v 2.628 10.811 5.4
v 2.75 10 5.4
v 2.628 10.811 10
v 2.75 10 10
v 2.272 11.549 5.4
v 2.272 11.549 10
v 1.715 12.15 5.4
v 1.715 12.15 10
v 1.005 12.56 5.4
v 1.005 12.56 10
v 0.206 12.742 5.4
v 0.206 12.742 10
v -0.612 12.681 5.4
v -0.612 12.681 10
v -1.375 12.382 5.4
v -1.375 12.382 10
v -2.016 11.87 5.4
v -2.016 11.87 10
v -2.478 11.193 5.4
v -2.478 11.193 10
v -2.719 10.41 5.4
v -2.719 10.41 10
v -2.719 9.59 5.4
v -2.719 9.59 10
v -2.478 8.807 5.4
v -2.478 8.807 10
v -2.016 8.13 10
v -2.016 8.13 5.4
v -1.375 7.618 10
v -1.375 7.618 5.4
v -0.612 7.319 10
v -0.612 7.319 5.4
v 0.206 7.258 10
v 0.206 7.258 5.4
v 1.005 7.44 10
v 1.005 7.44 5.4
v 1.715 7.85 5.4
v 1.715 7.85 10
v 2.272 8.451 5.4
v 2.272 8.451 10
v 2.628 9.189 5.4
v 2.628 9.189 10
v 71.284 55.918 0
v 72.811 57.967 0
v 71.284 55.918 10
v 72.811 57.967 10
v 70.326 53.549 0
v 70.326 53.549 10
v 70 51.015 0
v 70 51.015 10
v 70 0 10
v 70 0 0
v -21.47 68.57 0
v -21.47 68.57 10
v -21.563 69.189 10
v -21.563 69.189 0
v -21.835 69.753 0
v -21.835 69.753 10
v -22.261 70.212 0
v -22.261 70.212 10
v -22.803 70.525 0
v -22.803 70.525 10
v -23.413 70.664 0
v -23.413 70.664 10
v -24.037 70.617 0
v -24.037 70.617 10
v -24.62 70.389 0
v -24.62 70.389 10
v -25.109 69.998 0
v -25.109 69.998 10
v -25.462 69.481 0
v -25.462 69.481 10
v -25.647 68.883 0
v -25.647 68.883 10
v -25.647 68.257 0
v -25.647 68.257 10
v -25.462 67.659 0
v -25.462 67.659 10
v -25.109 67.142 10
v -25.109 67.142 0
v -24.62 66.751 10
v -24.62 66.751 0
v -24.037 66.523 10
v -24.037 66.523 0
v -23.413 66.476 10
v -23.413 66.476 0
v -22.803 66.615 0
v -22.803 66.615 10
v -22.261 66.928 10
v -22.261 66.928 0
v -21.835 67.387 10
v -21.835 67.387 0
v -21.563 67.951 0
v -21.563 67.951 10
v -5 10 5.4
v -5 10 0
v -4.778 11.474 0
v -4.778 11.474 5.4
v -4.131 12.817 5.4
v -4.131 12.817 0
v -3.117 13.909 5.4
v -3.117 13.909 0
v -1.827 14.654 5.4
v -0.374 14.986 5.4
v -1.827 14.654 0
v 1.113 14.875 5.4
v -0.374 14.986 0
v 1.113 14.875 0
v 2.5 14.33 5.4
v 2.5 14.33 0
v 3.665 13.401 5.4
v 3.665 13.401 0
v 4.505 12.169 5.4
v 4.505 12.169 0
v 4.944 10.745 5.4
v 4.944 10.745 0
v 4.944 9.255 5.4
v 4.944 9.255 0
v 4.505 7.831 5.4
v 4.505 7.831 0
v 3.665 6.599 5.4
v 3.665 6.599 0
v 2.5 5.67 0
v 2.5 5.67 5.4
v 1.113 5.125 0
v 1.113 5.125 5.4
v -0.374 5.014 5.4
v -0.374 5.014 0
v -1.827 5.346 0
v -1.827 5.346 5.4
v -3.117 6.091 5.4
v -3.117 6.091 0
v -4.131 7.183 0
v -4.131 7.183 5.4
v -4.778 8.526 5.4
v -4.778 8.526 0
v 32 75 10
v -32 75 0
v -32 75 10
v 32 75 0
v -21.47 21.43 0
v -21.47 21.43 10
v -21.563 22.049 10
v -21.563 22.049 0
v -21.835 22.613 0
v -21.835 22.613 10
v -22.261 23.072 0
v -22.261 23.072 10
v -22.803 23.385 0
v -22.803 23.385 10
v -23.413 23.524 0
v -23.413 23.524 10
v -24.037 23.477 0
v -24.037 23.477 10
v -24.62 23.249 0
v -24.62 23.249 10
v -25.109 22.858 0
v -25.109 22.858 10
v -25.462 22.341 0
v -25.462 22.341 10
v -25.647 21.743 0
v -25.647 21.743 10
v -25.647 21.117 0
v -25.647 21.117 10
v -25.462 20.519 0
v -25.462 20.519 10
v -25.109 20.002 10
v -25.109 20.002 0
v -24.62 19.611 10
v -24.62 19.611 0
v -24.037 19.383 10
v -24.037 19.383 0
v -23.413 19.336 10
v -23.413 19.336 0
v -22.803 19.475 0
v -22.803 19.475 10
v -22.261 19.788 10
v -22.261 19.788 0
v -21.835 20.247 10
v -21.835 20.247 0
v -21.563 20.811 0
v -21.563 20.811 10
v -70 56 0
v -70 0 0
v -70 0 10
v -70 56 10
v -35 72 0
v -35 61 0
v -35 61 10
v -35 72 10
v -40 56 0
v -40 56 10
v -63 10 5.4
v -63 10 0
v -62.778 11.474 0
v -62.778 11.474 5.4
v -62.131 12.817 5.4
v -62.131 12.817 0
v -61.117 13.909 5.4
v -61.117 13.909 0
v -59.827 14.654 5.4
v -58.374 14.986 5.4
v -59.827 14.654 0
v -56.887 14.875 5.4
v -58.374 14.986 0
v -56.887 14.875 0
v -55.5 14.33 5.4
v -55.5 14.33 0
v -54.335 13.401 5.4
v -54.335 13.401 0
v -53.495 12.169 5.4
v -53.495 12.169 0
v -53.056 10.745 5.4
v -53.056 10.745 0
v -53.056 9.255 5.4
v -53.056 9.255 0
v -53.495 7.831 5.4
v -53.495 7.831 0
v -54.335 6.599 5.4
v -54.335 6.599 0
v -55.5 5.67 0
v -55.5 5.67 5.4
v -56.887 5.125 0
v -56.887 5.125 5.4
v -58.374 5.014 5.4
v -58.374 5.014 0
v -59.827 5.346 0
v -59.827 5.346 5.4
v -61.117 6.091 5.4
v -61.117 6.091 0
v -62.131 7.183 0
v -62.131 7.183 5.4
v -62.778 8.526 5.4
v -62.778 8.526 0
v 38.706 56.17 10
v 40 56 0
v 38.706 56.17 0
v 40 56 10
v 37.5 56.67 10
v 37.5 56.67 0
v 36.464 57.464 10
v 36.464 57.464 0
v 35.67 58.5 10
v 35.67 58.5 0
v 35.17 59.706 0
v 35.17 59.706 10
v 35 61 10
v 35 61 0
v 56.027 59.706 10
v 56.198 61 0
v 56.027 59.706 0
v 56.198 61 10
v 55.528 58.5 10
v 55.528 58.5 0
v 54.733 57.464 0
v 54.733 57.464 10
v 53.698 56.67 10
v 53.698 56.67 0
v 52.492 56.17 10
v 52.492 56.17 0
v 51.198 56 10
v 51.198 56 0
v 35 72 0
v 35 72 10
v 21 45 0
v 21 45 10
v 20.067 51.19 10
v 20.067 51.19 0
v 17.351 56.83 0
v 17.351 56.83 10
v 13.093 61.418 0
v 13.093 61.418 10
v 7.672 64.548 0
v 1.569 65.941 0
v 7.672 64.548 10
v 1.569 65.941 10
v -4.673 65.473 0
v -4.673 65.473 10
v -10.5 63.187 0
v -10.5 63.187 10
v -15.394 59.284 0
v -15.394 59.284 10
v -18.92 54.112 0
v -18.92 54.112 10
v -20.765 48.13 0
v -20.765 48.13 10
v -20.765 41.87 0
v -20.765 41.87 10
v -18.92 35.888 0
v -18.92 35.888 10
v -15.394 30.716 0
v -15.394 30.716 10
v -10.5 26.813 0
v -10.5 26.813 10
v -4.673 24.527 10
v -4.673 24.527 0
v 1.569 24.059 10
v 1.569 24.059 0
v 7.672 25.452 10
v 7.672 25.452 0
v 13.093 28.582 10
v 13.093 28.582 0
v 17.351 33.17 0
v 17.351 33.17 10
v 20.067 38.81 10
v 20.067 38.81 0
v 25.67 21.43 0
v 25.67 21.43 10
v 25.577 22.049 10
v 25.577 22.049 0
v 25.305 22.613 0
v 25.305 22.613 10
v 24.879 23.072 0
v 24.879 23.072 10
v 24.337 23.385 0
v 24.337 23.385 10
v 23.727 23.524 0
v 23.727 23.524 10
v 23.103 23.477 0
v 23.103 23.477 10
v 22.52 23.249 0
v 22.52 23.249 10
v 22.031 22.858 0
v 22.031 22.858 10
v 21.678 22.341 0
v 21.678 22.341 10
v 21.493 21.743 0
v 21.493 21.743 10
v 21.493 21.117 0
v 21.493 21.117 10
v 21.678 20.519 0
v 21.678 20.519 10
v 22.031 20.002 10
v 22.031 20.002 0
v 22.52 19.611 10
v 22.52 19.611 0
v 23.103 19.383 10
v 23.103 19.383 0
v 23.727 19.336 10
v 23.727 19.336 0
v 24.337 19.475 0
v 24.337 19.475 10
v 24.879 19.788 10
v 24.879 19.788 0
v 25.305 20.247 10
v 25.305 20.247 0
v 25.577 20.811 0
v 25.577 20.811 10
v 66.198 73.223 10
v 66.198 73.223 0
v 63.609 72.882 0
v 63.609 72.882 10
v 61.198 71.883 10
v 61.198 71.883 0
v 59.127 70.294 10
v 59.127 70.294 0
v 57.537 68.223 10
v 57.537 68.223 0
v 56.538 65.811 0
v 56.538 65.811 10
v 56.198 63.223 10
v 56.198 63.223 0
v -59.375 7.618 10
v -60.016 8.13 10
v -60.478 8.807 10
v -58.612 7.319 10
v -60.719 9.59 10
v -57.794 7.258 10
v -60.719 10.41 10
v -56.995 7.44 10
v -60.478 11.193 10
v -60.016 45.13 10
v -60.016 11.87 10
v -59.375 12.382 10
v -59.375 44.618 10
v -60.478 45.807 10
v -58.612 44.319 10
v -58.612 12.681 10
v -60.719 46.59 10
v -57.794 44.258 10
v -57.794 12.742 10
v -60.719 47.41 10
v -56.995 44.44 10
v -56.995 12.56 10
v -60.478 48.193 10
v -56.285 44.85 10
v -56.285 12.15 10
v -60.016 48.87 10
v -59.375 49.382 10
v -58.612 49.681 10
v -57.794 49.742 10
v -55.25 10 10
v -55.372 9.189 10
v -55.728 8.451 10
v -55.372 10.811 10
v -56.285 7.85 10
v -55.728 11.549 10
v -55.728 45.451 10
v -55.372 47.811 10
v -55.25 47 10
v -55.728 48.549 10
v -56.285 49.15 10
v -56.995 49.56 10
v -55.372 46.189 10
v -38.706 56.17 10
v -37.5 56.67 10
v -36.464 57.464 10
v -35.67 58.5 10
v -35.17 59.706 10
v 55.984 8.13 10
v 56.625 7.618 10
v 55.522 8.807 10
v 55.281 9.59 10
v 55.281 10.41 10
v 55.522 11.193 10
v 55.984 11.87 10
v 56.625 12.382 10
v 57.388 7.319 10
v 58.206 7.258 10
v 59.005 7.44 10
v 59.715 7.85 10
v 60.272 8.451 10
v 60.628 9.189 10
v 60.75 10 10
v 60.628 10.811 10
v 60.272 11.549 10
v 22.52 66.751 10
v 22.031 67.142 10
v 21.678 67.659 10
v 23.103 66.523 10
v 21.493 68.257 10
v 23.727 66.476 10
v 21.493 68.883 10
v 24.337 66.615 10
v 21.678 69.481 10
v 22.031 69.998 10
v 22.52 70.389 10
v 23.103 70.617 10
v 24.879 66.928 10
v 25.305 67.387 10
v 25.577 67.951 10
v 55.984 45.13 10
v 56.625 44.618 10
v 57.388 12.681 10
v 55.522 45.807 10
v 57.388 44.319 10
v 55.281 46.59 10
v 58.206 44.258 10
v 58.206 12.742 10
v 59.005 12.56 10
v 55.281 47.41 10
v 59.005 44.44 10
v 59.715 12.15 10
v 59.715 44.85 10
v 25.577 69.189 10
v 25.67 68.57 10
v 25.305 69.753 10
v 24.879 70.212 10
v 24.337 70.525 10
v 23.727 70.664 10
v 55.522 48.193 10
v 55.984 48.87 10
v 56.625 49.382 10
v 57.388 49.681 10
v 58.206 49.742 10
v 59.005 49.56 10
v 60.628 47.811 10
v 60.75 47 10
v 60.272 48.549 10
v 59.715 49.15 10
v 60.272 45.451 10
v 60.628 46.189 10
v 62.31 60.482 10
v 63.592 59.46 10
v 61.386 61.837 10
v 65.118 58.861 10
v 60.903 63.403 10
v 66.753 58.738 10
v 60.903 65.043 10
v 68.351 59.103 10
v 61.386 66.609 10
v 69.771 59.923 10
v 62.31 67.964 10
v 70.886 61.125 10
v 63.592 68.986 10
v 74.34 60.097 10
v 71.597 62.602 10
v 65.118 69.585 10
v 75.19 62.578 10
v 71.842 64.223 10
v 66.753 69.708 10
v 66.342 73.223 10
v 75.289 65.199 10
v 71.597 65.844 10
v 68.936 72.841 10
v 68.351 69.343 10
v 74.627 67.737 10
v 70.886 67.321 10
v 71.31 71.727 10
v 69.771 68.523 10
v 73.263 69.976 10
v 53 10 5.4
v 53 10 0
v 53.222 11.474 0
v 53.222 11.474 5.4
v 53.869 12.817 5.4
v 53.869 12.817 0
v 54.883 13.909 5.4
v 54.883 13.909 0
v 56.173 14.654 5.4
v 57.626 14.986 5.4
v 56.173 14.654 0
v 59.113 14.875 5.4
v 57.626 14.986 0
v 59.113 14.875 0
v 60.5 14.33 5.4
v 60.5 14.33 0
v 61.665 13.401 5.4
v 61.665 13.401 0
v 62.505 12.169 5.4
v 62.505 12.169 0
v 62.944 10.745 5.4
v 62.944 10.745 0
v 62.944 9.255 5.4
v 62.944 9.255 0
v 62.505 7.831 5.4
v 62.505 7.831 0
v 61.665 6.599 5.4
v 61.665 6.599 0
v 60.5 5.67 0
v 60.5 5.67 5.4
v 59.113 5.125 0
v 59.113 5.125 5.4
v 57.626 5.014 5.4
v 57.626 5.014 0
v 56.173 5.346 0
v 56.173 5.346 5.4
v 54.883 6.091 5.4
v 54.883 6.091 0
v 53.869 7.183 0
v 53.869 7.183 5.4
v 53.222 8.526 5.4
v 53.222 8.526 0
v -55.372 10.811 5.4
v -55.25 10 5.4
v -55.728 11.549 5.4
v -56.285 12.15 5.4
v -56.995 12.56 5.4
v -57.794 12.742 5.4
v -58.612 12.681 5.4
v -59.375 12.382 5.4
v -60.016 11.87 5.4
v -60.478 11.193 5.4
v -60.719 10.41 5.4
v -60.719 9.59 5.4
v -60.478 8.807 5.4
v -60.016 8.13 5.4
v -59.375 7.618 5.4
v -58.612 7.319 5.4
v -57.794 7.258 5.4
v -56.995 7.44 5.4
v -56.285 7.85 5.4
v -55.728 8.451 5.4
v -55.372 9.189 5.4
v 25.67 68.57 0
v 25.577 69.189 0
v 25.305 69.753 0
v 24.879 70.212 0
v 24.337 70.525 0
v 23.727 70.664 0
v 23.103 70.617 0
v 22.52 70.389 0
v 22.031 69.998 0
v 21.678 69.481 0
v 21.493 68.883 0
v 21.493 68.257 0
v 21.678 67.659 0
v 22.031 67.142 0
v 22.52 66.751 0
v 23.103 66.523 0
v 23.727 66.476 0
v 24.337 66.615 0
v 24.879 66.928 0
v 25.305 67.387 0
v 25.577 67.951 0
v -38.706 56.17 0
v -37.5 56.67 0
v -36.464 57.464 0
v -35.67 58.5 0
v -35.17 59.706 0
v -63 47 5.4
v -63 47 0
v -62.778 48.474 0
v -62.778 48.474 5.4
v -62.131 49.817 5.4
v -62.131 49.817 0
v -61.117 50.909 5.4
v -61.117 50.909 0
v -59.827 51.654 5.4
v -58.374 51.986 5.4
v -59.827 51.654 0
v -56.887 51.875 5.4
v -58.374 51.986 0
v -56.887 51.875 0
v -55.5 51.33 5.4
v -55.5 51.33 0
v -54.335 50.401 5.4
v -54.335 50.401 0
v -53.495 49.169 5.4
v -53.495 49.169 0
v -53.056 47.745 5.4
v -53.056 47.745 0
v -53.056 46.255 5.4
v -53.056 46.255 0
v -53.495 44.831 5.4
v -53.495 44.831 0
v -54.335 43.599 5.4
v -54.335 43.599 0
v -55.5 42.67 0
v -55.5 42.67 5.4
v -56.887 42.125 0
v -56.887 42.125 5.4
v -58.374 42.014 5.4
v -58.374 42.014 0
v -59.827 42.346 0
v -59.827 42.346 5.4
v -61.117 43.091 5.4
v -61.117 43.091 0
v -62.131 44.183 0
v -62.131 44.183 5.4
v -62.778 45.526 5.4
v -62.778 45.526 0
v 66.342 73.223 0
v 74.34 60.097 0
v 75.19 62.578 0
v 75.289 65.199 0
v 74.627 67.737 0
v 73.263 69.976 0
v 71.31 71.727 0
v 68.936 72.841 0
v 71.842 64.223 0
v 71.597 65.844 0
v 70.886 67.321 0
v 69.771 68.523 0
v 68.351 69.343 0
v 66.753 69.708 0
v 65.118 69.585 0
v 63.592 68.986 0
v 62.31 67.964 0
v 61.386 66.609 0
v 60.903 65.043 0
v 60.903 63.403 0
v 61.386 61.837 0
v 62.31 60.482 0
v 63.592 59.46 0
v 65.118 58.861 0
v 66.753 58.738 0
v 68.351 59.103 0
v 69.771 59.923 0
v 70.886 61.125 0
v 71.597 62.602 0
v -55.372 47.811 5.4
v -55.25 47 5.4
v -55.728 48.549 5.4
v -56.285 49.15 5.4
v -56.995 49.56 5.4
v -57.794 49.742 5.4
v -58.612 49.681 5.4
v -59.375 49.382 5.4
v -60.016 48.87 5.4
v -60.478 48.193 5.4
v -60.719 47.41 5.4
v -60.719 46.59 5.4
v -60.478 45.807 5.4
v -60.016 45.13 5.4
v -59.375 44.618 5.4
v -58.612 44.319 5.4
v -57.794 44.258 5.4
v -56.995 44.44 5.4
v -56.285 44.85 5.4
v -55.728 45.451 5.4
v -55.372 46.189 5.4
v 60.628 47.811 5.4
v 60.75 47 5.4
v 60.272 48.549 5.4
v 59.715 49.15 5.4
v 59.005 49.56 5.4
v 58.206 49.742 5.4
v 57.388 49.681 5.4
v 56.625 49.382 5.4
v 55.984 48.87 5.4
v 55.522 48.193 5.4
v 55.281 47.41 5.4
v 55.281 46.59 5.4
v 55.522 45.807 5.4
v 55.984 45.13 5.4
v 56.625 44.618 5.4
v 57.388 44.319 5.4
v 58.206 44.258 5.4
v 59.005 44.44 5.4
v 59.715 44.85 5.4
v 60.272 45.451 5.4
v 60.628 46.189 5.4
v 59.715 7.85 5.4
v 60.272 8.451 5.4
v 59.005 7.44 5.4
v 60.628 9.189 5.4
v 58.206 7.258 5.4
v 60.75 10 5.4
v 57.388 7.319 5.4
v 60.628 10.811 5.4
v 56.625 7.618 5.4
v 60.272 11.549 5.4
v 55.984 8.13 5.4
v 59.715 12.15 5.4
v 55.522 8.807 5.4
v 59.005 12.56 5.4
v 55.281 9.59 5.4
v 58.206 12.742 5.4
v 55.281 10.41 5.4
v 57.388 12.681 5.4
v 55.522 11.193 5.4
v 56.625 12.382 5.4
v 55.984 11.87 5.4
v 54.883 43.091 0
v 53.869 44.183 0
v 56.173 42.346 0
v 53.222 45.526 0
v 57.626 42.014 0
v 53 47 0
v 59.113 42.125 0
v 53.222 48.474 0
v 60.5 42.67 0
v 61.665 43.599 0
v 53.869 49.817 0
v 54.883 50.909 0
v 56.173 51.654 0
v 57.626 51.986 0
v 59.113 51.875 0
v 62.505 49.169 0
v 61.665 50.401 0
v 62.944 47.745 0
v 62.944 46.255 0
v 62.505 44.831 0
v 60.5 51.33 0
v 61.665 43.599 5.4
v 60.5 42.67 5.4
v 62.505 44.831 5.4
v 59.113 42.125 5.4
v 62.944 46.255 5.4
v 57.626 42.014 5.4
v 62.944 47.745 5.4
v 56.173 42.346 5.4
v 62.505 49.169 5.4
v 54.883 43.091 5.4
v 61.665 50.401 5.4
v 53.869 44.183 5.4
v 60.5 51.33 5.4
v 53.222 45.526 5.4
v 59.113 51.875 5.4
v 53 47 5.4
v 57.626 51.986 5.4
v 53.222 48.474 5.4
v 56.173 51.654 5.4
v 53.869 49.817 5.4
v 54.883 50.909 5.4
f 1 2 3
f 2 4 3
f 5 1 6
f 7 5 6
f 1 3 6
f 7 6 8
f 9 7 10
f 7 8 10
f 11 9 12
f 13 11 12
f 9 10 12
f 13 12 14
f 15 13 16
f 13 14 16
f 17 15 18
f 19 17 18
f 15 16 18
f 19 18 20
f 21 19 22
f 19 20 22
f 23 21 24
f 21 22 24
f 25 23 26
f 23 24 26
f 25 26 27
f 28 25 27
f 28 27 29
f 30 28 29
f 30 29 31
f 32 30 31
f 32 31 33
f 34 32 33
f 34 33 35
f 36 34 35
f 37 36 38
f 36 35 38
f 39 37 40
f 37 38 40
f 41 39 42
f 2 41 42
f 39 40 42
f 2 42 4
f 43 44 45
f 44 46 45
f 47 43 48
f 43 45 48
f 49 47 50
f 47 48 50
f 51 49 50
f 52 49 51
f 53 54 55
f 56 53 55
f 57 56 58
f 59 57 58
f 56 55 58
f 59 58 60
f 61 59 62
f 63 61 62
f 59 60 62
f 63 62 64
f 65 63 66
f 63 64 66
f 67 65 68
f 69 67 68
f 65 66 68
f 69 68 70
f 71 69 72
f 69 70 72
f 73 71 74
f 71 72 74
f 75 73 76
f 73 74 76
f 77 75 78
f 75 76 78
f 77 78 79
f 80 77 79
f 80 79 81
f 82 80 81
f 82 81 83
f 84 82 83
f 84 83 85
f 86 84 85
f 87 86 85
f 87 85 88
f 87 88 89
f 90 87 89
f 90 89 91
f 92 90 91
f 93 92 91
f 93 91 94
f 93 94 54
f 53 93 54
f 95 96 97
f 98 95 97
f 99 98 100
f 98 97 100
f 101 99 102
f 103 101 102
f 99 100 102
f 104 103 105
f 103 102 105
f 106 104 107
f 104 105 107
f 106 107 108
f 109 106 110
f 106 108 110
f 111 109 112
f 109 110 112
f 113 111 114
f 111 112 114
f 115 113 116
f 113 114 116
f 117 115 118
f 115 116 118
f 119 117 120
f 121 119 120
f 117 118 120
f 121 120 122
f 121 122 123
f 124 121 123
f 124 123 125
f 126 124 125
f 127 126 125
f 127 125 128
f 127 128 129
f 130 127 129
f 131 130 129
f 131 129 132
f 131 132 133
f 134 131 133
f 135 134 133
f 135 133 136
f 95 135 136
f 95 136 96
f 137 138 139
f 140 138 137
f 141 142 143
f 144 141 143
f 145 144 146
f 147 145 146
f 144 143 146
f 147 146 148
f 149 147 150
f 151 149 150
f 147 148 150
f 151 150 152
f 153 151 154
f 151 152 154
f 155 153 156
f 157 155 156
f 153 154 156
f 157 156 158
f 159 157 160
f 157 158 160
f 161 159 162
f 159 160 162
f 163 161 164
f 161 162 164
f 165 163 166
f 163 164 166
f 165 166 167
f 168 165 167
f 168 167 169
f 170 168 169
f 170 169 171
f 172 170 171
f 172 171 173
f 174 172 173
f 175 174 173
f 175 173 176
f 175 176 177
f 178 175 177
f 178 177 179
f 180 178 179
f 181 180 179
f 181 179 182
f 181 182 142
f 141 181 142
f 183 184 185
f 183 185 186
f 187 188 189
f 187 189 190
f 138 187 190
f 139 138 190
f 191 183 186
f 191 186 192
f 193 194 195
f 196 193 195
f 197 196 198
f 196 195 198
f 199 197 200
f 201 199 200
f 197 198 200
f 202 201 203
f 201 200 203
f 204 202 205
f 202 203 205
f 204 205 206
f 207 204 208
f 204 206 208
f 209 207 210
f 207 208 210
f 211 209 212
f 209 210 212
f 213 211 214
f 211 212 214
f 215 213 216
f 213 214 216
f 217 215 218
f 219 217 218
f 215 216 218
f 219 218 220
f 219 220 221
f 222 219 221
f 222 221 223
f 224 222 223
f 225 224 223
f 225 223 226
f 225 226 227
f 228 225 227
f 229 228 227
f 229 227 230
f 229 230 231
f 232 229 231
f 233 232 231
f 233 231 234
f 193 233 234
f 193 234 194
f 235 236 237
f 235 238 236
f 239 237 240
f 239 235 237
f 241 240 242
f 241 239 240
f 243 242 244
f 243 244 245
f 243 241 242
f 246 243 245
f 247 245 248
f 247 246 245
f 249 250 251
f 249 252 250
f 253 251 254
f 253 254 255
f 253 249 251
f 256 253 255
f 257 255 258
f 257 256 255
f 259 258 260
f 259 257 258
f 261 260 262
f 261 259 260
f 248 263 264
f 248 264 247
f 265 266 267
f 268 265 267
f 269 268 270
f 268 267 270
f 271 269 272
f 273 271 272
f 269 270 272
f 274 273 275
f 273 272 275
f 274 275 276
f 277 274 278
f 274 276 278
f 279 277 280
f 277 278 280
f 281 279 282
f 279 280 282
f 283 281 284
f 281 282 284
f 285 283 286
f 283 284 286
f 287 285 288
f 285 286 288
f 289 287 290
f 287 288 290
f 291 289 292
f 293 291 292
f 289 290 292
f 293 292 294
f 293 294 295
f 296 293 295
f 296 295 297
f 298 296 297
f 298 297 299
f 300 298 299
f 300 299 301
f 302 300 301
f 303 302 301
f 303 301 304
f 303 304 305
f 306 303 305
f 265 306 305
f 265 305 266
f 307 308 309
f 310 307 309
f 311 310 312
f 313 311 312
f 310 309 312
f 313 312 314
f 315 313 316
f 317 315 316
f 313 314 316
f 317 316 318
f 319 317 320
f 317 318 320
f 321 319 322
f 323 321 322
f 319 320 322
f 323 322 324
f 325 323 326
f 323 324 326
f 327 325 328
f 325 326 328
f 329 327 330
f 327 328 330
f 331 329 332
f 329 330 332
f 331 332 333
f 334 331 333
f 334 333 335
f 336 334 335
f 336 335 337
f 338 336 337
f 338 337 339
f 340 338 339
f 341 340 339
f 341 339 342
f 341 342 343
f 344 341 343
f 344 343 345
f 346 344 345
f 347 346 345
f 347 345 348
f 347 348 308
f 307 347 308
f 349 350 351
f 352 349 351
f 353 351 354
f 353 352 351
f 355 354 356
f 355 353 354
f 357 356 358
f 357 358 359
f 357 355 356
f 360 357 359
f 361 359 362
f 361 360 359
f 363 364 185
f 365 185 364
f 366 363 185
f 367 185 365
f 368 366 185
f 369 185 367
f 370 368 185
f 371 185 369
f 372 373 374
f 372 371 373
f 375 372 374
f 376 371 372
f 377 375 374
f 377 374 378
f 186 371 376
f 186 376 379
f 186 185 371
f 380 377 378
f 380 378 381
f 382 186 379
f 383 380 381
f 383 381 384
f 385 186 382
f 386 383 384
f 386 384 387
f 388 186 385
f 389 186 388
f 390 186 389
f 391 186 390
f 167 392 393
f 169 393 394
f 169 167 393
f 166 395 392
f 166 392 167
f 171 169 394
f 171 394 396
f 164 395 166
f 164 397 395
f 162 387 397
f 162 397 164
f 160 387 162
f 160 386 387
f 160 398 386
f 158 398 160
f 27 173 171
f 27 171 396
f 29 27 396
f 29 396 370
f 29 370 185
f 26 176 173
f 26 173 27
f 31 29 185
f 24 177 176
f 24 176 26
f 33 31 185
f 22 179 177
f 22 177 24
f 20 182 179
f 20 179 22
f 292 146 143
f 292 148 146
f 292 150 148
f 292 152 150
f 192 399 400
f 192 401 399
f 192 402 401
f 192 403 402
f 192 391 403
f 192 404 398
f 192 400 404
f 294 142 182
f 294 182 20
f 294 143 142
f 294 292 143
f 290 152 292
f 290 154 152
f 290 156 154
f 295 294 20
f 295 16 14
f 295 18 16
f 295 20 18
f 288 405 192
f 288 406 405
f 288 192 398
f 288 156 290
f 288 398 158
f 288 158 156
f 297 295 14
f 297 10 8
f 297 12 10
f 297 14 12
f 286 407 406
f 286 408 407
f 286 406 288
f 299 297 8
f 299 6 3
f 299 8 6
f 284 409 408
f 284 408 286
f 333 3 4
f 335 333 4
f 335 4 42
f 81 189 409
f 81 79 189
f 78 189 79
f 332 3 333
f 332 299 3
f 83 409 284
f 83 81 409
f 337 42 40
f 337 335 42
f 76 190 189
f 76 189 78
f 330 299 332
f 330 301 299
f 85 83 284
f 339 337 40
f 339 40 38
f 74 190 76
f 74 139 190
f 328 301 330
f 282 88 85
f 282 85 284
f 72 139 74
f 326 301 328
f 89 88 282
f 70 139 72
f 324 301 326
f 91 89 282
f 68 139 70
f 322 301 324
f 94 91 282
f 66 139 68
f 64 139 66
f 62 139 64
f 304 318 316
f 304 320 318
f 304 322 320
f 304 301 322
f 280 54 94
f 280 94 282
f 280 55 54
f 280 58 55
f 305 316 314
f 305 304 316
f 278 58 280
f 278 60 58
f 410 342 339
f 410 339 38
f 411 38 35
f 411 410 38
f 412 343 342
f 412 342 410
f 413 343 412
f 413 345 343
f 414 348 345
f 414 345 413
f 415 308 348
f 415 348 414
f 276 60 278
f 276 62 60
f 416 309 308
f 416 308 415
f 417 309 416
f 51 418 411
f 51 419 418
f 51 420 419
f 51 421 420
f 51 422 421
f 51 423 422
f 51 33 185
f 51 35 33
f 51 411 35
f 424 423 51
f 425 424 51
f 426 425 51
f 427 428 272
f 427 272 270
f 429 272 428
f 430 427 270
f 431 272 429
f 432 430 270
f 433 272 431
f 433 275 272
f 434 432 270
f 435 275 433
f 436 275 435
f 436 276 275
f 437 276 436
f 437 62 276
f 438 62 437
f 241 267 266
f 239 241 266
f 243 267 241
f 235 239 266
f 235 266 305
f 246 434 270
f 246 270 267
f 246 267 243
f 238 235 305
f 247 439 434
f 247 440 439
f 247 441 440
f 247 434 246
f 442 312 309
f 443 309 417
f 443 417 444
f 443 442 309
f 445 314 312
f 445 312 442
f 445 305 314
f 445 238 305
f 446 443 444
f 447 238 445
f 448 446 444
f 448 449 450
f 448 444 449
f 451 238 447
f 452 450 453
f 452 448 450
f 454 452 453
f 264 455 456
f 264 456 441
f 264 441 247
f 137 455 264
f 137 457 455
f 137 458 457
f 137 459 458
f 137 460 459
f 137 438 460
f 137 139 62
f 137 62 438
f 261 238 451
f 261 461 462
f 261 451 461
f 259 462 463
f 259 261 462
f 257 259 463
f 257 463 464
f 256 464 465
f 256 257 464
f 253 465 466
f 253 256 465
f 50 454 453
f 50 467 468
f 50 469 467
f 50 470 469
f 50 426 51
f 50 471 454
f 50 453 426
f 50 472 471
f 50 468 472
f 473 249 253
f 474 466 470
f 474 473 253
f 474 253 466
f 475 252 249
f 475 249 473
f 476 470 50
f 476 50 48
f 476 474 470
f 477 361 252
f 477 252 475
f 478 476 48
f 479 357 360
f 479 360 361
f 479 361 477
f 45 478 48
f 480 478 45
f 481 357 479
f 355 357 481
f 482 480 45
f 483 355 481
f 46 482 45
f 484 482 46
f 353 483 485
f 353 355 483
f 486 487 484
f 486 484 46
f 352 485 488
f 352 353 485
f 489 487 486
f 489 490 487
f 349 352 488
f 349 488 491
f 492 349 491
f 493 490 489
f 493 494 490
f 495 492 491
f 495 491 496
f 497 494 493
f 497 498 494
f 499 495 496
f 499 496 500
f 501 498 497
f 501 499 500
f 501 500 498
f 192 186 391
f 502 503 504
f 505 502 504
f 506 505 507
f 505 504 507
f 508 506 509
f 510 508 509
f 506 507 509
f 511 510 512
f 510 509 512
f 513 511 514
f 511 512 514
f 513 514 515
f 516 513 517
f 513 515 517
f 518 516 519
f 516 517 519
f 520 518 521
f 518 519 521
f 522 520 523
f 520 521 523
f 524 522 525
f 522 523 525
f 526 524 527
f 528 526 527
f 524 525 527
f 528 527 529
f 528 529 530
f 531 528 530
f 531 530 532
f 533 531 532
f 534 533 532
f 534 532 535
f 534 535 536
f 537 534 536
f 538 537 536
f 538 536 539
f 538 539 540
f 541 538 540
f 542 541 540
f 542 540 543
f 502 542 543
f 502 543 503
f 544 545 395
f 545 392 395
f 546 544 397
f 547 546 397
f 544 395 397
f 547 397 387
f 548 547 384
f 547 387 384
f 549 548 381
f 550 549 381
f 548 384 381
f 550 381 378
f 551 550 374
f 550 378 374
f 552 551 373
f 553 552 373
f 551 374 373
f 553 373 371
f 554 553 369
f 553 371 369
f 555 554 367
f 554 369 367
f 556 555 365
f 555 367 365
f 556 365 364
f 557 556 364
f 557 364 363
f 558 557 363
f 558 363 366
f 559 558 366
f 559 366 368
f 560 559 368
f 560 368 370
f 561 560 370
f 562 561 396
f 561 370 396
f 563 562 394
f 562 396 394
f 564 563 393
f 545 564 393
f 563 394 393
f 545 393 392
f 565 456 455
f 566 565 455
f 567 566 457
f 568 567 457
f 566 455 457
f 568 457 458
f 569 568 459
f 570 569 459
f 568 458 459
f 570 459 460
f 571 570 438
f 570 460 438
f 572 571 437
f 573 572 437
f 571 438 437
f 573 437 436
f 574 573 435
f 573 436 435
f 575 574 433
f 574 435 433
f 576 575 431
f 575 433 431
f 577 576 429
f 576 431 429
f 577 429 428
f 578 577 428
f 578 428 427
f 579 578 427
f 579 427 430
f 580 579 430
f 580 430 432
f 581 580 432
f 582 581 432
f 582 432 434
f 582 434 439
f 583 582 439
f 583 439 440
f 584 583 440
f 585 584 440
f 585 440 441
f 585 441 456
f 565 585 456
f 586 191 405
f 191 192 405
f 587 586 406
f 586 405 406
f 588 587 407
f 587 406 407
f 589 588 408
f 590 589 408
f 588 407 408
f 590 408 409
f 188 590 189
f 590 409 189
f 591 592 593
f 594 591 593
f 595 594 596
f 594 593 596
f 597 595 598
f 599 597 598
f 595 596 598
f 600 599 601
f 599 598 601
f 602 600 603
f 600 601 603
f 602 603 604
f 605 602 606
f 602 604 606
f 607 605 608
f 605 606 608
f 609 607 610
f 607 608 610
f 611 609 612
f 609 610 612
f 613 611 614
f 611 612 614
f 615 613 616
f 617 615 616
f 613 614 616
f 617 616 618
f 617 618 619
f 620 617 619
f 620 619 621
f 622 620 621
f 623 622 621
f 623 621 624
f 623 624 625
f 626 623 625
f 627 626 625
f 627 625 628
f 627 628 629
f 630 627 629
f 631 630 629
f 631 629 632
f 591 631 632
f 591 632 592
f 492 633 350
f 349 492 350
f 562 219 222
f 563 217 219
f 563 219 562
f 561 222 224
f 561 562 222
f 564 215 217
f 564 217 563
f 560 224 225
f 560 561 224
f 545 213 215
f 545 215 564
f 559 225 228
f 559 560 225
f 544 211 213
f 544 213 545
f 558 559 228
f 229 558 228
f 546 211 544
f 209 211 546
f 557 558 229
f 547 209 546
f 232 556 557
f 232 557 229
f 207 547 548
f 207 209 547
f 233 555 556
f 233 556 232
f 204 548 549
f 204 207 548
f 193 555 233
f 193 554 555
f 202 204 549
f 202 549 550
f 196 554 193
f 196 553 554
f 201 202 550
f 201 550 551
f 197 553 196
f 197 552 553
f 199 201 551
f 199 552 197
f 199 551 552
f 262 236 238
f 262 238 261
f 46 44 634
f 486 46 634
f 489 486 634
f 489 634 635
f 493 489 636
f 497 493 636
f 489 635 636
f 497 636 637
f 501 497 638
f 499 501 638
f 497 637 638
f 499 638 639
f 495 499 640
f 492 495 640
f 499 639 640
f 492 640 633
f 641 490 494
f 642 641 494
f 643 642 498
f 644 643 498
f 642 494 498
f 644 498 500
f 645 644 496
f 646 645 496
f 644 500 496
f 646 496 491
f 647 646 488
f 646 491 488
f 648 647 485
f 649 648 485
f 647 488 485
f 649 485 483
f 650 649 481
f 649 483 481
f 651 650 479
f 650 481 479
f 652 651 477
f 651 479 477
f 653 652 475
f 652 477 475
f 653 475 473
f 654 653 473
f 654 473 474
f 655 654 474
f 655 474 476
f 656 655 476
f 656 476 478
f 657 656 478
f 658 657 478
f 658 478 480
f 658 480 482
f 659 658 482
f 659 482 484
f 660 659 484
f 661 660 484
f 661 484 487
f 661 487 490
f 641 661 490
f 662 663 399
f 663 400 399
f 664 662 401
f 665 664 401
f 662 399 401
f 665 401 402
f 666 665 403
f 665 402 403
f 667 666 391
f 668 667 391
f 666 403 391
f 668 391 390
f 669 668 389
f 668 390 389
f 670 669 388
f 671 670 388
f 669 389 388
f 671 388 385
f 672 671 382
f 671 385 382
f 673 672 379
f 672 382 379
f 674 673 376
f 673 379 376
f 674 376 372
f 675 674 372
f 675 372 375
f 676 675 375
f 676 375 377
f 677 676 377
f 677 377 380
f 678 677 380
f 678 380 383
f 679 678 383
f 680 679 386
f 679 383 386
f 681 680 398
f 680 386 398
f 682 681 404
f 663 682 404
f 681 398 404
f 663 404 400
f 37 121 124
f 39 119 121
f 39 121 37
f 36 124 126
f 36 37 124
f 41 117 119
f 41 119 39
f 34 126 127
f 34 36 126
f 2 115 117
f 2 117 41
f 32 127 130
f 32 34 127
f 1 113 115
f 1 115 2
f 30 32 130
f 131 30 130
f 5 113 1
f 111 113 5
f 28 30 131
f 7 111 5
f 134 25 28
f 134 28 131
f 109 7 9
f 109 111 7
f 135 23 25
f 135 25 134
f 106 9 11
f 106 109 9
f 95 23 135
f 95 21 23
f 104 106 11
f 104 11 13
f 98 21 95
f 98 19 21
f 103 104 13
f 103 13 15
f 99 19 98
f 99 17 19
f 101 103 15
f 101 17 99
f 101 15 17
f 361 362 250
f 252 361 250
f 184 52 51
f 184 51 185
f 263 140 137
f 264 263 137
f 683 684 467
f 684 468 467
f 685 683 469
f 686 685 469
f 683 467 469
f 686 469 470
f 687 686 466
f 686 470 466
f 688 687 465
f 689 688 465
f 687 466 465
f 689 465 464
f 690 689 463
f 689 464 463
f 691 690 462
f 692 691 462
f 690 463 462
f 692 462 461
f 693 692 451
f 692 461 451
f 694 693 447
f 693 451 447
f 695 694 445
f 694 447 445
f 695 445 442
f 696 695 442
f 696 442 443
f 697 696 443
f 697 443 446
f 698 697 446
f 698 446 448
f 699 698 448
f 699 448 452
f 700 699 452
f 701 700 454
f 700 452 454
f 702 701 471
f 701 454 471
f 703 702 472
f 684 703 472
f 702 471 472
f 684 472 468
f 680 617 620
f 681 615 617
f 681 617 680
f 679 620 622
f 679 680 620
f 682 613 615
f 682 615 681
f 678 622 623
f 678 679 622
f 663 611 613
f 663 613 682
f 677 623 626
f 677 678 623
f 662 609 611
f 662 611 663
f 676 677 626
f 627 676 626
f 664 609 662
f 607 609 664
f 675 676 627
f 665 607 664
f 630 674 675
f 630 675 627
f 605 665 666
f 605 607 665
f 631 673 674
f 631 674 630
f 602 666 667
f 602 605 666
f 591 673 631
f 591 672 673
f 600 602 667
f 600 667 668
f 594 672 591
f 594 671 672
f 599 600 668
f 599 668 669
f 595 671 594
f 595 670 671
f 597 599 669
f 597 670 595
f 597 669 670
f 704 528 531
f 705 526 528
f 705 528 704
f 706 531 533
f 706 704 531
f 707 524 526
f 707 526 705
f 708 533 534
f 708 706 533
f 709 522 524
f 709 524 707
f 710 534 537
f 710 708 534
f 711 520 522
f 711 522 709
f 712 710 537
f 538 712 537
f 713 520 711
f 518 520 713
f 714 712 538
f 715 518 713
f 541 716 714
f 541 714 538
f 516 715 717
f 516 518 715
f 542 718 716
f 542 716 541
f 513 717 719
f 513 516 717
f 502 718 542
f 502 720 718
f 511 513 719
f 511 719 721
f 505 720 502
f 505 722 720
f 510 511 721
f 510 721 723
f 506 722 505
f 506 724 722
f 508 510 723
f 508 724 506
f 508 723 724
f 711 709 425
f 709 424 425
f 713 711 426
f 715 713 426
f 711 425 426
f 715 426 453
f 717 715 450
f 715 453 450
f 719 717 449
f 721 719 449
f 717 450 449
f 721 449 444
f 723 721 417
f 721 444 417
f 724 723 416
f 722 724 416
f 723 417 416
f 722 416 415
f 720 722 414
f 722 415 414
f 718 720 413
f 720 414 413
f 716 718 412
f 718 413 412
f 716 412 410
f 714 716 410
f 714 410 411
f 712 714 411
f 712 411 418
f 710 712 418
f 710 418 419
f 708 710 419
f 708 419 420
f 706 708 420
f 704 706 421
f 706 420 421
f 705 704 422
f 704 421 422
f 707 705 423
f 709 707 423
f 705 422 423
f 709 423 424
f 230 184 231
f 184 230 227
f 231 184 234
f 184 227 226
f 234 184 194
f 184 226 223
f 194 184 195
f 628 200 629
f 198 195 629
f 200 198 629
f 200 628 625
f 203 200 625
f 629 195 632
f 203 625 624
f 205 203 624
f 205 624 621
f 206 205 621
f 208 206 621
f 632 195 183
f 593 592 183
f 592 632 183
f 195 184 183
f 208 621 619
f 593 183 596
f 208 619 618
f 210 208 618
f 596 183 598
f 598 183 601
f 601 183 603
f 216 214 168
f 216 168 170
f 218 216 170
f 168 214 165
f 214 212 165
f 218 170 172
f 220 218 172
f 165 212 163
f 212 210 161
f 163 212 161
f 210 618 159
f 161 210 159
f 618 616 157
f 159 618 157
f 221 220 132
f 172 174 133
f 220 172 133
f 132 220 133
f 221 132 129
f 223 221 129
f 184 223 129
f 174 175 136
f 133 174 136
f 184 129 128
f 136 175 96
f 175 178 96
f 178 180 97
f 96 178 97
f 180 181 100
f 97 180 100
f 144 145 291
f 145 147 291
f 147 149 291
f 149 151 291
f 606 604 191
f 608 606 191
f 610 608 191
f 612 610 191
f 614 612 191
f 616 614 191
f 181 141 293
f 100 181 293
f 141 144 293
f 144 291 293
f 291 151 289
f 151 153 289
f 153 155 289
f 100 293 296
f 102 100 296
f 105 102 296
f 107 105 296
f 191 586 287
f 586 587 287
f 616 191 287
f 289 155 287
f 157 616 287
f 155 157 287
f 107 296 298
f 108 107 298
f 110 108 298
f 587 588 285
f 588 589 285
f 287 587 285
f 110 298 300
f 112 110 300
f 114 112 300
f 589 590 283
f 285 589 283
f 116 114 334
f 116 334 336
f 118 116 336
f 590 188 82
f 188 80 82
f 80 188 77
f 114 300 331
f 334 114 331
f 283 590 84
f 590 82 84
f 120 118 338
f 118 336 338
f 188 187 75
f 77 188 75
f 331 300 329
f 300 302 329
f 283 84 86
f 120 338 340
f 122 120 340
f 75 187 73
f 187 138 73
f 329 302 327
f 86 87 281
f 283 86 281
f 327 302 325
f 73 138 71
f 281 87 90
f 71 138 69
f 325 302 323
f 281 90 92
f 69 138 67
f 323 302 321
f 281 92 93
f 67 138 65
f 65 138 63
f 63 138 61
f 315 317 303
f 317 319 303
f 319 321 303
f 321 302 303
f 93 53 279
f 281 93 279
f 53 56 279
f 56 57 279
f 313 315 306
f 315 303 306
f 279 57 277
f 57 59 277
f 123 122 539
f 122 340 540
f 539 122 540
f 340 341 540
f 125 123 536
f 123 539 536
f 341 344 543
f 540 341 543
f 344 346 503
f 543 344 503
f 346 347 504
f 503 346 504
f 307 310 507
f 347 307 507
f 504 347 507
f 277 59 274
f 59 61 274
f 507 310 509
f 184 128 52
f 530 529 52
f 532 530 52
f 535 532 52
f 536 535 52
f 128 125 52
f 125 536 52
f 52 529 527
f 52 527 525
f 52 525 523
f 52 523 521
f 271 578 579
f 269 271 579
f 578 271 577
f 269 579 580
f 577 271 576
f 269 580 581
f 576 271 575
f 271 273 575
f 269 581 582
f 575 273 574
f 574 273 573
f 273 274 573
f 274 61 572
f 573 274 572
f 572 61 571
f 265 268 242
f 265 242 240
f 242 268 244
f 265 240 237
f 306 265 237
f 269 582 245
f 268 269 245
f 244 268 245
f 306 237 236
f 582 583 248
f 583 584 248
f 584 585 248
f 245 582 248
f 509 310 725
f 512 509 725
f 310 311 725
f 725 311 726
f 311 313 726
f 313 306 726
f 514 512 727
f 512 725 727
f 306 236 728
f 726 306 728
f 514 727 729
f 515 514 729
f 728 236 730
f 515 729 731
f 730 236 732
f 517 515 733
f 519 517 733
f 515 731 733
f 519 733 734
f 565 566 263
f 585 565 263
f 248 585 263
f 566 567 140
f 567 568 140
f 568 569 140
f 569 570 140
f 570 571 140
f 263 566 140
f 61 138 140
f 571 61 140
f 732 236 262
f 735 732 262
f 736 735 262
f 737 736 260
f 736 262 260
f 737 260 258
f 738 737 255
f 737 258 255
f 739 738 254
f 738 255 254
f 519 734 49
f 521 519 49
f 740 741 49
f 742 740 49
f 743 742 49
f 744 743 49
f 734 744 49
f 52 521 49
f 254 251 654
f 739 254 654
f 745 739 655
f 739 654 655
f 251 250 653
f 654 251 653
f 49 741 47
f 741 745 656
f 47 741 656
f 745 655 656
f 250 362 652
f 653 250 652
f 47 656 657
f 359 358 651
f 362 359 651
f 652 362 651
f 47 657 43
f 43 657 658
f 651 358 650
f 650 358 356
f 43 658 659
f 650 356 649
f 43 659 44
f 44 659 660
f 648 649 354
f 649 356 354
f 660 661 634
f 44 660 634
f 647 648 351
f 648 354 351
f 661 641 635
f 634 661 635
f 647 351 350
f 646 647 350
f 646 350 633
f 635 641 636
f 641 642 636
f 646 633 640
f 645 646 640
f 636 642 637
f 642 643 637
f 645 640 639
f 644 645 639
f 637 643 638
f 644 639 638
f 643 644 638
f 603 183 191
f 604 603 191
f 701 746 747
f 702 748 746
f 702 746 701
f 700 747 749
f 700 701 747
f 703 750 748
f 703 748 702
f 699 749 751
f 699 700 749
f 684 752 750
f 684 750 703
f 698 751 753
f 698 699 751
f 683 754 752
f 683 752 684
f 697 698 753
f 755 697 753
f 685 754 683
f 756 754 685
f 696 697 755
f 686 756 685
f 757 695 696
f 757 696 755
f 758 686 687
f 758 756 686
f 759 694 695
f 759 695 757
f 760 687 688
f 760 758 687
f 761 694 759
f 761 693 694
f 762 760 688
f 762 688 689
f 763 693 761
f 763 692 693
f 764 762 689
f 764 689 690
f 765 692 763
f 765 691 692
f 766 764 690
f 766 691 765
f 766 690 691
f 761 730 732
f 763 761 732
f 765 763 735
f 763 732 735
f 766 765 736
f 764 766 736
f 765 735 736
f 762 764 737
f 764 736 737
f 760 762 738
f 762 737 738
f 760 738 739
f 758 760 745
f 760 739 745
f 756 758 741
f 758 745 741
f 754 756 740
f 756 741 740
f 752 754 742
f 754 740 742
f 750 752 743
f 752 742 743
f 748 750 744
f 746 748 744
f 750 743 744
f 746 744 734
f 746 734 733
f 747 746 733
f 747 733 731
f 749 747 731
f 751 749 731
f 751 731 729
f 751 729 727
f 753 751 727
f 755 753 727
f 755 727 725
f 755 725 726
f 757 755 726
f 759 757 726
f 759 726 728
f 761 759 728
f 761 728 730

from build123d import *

# Parameters (mm, degrees)
EXTRUDE1_DEPTH                                      = 10
M5_TAPPED_HOLE1_D                                   = 4.2
CUT_EXTRUDE1_REACH                                  = 12
SKETCH4_R                                           = 21
CHAMFER1_SIZE                                       = 3
CBORE_FOR_M5_HEX_SOCKET_HEAD_CAP_SCREW1_D           = 5.5
CBORE_FOR_M5_HEX_SOCKET_HEAD_CAP_SCREW1_CBORE_D     = 10
CBORE_FOR_M5_HEX_SOCKET_HEAD_CAP_SCREW1_CBORE_DEPTH = 5.4
EXTRUDE2_DEPTH                                      = 10
FILLET3_R                                           = 10
FILLET4_R                                           = 5
M12X1_0_TAPPED_HOLE2_D                              = 11
M12X1_0_TAPPED_HOLE1_D                              = 11


with BuildPart() as part:
    # Sketch1 → Extrude1 (new body)
    with BuildSketch(Plane.XY):
        Polygon((35, 56), (70, 56), (70, 0), (-70, 0), (-70, 56), (-35, 56), (-35, 75), (35, 75), align=None)
    extrude(amount=EXTRUDE1_DEPTH)

    # M5 Tapped Hole1 (through all)
    with Locations(Plane(origin=(0, 0, 0), x_dir=(-1, 0, 0), z_dir=(0, 0, -1))):
        with Locations((-23.57, 68.57), (23.57, 68.57), (-23.57, 21.43), (23.57, 21.43)):
            Hole(M5_TAPPED_HOLE1_D / 2)

    # Sketch4 → Cut-Extrude1 (cut, up to next)
    with BuildSketch(Plane.XY.offset(10), mode=Mode.PRIVATE) as cut_extrude1_sk1:
        with Locations((0, 45)):
            Circle(SKETCH4_R)
    cut_extrude1_tool1 = extrude(cut_extrude1_sk1.sketch, amount=-CUT_EXTRUDE1_REACH, mode=Mode.PRIVATE) & part.part
    add(cut_extrude1_tool1.solids().sort_by_distance((0, 45, 10))[0], mode=Mode.SUBTRACT)

    # Chamfer1
    chamfer1_edges = [part.edges().sort_by_distance(p)[0] for p in [
        (-35, 75, 5),
        (35, 75, 5),
    ]]
    chamfer(chamfer1_edges, length=CHAMFER1_SIZE)

    # CBORE for M5 Hex Socket Head Cap Screw1 (through all)
    with Locations(Plane(origin=(0, 0, 0), x_dir=(-1, 0, 0), z_dir=(0, 0, -1))):
        with Locations((-58, 10), (0, 10), (58, 10), (58, 47), (-58, 47)):
            CounterBoreHole(CBORE_FOR_M5_HEX_SOCKET_HEAD_CAP_SCREW1_D / 2, CBORE_FOR_M5_HEX_SOCKET_HEAD_CAP_SCREW1_CBORE_D / 2, CBORE_FOR_M5_HEX_SOCKET_HEAD_CAP_SCREW1_CBORE_DEPTH)

    # Sketch7 → Extrude2 (add)
    with BuildSketch(Plane(origin=(0, 0, 0), x_dir=(-1, 0, 0), z_dir=(0, 0, -1))):
        with BuildLine():
            Line((-66.341582795, 73.222893867), (-56.19763933, 73.222893867))
            Line((-56.19763933, 73.222893867), (-56.19763933, 56))
            Line((-56.19763933, 56), (-70, 56))
            ThreePointArc((-70, 56), (-75.145162885, 66.092914615), (-66.341582795, 73.222893867))
        make_face()
    extrude(amount=-EXTRUDE2_DEPTH)

    # Fillet3
    fillet3_edges = [part.edges().sort_by_distance(p)[0] for p in [
        (56.19763933, 73.222893867, 5),
        (70, 56, 5),
    ]]
    fillet(fillet3_edges, radius=FILLET3_R)

    # Fillet4
    fillet4_edges = [part.edges().sort_by_distance(p)[0] for p in [
        (56.19763933, 56, 5),
        (-35, 56, 5),
        (35, 56, 5),
    ]]
    fillet(fillet4_edges, radius=FILLET4_R)

    # M12x1.0 Tapped Hole2 (through all)
    with Locations(Plane(origin=(0, 0, 0), x_dir=(-1, 0, 0), z_dir=(0, 0, -1))):
        with Locations((-66.341582795, 64.222893867)):
            Hole(M12X1_0_TAPPED_HOLE2_D / 2)

    # M12x1.0 Tapped Hole1 (through all)
    with Locations(Plane(origin=(0, 0, 0), x_dir=(-1, 0, 0), z_dir=(0, 0, -1))):
        with Locations((-66.341582795, 64.222893867)):
            Hole(M12X1_0_TAPPED_HOLE1_D / 2)


solid = part.part
